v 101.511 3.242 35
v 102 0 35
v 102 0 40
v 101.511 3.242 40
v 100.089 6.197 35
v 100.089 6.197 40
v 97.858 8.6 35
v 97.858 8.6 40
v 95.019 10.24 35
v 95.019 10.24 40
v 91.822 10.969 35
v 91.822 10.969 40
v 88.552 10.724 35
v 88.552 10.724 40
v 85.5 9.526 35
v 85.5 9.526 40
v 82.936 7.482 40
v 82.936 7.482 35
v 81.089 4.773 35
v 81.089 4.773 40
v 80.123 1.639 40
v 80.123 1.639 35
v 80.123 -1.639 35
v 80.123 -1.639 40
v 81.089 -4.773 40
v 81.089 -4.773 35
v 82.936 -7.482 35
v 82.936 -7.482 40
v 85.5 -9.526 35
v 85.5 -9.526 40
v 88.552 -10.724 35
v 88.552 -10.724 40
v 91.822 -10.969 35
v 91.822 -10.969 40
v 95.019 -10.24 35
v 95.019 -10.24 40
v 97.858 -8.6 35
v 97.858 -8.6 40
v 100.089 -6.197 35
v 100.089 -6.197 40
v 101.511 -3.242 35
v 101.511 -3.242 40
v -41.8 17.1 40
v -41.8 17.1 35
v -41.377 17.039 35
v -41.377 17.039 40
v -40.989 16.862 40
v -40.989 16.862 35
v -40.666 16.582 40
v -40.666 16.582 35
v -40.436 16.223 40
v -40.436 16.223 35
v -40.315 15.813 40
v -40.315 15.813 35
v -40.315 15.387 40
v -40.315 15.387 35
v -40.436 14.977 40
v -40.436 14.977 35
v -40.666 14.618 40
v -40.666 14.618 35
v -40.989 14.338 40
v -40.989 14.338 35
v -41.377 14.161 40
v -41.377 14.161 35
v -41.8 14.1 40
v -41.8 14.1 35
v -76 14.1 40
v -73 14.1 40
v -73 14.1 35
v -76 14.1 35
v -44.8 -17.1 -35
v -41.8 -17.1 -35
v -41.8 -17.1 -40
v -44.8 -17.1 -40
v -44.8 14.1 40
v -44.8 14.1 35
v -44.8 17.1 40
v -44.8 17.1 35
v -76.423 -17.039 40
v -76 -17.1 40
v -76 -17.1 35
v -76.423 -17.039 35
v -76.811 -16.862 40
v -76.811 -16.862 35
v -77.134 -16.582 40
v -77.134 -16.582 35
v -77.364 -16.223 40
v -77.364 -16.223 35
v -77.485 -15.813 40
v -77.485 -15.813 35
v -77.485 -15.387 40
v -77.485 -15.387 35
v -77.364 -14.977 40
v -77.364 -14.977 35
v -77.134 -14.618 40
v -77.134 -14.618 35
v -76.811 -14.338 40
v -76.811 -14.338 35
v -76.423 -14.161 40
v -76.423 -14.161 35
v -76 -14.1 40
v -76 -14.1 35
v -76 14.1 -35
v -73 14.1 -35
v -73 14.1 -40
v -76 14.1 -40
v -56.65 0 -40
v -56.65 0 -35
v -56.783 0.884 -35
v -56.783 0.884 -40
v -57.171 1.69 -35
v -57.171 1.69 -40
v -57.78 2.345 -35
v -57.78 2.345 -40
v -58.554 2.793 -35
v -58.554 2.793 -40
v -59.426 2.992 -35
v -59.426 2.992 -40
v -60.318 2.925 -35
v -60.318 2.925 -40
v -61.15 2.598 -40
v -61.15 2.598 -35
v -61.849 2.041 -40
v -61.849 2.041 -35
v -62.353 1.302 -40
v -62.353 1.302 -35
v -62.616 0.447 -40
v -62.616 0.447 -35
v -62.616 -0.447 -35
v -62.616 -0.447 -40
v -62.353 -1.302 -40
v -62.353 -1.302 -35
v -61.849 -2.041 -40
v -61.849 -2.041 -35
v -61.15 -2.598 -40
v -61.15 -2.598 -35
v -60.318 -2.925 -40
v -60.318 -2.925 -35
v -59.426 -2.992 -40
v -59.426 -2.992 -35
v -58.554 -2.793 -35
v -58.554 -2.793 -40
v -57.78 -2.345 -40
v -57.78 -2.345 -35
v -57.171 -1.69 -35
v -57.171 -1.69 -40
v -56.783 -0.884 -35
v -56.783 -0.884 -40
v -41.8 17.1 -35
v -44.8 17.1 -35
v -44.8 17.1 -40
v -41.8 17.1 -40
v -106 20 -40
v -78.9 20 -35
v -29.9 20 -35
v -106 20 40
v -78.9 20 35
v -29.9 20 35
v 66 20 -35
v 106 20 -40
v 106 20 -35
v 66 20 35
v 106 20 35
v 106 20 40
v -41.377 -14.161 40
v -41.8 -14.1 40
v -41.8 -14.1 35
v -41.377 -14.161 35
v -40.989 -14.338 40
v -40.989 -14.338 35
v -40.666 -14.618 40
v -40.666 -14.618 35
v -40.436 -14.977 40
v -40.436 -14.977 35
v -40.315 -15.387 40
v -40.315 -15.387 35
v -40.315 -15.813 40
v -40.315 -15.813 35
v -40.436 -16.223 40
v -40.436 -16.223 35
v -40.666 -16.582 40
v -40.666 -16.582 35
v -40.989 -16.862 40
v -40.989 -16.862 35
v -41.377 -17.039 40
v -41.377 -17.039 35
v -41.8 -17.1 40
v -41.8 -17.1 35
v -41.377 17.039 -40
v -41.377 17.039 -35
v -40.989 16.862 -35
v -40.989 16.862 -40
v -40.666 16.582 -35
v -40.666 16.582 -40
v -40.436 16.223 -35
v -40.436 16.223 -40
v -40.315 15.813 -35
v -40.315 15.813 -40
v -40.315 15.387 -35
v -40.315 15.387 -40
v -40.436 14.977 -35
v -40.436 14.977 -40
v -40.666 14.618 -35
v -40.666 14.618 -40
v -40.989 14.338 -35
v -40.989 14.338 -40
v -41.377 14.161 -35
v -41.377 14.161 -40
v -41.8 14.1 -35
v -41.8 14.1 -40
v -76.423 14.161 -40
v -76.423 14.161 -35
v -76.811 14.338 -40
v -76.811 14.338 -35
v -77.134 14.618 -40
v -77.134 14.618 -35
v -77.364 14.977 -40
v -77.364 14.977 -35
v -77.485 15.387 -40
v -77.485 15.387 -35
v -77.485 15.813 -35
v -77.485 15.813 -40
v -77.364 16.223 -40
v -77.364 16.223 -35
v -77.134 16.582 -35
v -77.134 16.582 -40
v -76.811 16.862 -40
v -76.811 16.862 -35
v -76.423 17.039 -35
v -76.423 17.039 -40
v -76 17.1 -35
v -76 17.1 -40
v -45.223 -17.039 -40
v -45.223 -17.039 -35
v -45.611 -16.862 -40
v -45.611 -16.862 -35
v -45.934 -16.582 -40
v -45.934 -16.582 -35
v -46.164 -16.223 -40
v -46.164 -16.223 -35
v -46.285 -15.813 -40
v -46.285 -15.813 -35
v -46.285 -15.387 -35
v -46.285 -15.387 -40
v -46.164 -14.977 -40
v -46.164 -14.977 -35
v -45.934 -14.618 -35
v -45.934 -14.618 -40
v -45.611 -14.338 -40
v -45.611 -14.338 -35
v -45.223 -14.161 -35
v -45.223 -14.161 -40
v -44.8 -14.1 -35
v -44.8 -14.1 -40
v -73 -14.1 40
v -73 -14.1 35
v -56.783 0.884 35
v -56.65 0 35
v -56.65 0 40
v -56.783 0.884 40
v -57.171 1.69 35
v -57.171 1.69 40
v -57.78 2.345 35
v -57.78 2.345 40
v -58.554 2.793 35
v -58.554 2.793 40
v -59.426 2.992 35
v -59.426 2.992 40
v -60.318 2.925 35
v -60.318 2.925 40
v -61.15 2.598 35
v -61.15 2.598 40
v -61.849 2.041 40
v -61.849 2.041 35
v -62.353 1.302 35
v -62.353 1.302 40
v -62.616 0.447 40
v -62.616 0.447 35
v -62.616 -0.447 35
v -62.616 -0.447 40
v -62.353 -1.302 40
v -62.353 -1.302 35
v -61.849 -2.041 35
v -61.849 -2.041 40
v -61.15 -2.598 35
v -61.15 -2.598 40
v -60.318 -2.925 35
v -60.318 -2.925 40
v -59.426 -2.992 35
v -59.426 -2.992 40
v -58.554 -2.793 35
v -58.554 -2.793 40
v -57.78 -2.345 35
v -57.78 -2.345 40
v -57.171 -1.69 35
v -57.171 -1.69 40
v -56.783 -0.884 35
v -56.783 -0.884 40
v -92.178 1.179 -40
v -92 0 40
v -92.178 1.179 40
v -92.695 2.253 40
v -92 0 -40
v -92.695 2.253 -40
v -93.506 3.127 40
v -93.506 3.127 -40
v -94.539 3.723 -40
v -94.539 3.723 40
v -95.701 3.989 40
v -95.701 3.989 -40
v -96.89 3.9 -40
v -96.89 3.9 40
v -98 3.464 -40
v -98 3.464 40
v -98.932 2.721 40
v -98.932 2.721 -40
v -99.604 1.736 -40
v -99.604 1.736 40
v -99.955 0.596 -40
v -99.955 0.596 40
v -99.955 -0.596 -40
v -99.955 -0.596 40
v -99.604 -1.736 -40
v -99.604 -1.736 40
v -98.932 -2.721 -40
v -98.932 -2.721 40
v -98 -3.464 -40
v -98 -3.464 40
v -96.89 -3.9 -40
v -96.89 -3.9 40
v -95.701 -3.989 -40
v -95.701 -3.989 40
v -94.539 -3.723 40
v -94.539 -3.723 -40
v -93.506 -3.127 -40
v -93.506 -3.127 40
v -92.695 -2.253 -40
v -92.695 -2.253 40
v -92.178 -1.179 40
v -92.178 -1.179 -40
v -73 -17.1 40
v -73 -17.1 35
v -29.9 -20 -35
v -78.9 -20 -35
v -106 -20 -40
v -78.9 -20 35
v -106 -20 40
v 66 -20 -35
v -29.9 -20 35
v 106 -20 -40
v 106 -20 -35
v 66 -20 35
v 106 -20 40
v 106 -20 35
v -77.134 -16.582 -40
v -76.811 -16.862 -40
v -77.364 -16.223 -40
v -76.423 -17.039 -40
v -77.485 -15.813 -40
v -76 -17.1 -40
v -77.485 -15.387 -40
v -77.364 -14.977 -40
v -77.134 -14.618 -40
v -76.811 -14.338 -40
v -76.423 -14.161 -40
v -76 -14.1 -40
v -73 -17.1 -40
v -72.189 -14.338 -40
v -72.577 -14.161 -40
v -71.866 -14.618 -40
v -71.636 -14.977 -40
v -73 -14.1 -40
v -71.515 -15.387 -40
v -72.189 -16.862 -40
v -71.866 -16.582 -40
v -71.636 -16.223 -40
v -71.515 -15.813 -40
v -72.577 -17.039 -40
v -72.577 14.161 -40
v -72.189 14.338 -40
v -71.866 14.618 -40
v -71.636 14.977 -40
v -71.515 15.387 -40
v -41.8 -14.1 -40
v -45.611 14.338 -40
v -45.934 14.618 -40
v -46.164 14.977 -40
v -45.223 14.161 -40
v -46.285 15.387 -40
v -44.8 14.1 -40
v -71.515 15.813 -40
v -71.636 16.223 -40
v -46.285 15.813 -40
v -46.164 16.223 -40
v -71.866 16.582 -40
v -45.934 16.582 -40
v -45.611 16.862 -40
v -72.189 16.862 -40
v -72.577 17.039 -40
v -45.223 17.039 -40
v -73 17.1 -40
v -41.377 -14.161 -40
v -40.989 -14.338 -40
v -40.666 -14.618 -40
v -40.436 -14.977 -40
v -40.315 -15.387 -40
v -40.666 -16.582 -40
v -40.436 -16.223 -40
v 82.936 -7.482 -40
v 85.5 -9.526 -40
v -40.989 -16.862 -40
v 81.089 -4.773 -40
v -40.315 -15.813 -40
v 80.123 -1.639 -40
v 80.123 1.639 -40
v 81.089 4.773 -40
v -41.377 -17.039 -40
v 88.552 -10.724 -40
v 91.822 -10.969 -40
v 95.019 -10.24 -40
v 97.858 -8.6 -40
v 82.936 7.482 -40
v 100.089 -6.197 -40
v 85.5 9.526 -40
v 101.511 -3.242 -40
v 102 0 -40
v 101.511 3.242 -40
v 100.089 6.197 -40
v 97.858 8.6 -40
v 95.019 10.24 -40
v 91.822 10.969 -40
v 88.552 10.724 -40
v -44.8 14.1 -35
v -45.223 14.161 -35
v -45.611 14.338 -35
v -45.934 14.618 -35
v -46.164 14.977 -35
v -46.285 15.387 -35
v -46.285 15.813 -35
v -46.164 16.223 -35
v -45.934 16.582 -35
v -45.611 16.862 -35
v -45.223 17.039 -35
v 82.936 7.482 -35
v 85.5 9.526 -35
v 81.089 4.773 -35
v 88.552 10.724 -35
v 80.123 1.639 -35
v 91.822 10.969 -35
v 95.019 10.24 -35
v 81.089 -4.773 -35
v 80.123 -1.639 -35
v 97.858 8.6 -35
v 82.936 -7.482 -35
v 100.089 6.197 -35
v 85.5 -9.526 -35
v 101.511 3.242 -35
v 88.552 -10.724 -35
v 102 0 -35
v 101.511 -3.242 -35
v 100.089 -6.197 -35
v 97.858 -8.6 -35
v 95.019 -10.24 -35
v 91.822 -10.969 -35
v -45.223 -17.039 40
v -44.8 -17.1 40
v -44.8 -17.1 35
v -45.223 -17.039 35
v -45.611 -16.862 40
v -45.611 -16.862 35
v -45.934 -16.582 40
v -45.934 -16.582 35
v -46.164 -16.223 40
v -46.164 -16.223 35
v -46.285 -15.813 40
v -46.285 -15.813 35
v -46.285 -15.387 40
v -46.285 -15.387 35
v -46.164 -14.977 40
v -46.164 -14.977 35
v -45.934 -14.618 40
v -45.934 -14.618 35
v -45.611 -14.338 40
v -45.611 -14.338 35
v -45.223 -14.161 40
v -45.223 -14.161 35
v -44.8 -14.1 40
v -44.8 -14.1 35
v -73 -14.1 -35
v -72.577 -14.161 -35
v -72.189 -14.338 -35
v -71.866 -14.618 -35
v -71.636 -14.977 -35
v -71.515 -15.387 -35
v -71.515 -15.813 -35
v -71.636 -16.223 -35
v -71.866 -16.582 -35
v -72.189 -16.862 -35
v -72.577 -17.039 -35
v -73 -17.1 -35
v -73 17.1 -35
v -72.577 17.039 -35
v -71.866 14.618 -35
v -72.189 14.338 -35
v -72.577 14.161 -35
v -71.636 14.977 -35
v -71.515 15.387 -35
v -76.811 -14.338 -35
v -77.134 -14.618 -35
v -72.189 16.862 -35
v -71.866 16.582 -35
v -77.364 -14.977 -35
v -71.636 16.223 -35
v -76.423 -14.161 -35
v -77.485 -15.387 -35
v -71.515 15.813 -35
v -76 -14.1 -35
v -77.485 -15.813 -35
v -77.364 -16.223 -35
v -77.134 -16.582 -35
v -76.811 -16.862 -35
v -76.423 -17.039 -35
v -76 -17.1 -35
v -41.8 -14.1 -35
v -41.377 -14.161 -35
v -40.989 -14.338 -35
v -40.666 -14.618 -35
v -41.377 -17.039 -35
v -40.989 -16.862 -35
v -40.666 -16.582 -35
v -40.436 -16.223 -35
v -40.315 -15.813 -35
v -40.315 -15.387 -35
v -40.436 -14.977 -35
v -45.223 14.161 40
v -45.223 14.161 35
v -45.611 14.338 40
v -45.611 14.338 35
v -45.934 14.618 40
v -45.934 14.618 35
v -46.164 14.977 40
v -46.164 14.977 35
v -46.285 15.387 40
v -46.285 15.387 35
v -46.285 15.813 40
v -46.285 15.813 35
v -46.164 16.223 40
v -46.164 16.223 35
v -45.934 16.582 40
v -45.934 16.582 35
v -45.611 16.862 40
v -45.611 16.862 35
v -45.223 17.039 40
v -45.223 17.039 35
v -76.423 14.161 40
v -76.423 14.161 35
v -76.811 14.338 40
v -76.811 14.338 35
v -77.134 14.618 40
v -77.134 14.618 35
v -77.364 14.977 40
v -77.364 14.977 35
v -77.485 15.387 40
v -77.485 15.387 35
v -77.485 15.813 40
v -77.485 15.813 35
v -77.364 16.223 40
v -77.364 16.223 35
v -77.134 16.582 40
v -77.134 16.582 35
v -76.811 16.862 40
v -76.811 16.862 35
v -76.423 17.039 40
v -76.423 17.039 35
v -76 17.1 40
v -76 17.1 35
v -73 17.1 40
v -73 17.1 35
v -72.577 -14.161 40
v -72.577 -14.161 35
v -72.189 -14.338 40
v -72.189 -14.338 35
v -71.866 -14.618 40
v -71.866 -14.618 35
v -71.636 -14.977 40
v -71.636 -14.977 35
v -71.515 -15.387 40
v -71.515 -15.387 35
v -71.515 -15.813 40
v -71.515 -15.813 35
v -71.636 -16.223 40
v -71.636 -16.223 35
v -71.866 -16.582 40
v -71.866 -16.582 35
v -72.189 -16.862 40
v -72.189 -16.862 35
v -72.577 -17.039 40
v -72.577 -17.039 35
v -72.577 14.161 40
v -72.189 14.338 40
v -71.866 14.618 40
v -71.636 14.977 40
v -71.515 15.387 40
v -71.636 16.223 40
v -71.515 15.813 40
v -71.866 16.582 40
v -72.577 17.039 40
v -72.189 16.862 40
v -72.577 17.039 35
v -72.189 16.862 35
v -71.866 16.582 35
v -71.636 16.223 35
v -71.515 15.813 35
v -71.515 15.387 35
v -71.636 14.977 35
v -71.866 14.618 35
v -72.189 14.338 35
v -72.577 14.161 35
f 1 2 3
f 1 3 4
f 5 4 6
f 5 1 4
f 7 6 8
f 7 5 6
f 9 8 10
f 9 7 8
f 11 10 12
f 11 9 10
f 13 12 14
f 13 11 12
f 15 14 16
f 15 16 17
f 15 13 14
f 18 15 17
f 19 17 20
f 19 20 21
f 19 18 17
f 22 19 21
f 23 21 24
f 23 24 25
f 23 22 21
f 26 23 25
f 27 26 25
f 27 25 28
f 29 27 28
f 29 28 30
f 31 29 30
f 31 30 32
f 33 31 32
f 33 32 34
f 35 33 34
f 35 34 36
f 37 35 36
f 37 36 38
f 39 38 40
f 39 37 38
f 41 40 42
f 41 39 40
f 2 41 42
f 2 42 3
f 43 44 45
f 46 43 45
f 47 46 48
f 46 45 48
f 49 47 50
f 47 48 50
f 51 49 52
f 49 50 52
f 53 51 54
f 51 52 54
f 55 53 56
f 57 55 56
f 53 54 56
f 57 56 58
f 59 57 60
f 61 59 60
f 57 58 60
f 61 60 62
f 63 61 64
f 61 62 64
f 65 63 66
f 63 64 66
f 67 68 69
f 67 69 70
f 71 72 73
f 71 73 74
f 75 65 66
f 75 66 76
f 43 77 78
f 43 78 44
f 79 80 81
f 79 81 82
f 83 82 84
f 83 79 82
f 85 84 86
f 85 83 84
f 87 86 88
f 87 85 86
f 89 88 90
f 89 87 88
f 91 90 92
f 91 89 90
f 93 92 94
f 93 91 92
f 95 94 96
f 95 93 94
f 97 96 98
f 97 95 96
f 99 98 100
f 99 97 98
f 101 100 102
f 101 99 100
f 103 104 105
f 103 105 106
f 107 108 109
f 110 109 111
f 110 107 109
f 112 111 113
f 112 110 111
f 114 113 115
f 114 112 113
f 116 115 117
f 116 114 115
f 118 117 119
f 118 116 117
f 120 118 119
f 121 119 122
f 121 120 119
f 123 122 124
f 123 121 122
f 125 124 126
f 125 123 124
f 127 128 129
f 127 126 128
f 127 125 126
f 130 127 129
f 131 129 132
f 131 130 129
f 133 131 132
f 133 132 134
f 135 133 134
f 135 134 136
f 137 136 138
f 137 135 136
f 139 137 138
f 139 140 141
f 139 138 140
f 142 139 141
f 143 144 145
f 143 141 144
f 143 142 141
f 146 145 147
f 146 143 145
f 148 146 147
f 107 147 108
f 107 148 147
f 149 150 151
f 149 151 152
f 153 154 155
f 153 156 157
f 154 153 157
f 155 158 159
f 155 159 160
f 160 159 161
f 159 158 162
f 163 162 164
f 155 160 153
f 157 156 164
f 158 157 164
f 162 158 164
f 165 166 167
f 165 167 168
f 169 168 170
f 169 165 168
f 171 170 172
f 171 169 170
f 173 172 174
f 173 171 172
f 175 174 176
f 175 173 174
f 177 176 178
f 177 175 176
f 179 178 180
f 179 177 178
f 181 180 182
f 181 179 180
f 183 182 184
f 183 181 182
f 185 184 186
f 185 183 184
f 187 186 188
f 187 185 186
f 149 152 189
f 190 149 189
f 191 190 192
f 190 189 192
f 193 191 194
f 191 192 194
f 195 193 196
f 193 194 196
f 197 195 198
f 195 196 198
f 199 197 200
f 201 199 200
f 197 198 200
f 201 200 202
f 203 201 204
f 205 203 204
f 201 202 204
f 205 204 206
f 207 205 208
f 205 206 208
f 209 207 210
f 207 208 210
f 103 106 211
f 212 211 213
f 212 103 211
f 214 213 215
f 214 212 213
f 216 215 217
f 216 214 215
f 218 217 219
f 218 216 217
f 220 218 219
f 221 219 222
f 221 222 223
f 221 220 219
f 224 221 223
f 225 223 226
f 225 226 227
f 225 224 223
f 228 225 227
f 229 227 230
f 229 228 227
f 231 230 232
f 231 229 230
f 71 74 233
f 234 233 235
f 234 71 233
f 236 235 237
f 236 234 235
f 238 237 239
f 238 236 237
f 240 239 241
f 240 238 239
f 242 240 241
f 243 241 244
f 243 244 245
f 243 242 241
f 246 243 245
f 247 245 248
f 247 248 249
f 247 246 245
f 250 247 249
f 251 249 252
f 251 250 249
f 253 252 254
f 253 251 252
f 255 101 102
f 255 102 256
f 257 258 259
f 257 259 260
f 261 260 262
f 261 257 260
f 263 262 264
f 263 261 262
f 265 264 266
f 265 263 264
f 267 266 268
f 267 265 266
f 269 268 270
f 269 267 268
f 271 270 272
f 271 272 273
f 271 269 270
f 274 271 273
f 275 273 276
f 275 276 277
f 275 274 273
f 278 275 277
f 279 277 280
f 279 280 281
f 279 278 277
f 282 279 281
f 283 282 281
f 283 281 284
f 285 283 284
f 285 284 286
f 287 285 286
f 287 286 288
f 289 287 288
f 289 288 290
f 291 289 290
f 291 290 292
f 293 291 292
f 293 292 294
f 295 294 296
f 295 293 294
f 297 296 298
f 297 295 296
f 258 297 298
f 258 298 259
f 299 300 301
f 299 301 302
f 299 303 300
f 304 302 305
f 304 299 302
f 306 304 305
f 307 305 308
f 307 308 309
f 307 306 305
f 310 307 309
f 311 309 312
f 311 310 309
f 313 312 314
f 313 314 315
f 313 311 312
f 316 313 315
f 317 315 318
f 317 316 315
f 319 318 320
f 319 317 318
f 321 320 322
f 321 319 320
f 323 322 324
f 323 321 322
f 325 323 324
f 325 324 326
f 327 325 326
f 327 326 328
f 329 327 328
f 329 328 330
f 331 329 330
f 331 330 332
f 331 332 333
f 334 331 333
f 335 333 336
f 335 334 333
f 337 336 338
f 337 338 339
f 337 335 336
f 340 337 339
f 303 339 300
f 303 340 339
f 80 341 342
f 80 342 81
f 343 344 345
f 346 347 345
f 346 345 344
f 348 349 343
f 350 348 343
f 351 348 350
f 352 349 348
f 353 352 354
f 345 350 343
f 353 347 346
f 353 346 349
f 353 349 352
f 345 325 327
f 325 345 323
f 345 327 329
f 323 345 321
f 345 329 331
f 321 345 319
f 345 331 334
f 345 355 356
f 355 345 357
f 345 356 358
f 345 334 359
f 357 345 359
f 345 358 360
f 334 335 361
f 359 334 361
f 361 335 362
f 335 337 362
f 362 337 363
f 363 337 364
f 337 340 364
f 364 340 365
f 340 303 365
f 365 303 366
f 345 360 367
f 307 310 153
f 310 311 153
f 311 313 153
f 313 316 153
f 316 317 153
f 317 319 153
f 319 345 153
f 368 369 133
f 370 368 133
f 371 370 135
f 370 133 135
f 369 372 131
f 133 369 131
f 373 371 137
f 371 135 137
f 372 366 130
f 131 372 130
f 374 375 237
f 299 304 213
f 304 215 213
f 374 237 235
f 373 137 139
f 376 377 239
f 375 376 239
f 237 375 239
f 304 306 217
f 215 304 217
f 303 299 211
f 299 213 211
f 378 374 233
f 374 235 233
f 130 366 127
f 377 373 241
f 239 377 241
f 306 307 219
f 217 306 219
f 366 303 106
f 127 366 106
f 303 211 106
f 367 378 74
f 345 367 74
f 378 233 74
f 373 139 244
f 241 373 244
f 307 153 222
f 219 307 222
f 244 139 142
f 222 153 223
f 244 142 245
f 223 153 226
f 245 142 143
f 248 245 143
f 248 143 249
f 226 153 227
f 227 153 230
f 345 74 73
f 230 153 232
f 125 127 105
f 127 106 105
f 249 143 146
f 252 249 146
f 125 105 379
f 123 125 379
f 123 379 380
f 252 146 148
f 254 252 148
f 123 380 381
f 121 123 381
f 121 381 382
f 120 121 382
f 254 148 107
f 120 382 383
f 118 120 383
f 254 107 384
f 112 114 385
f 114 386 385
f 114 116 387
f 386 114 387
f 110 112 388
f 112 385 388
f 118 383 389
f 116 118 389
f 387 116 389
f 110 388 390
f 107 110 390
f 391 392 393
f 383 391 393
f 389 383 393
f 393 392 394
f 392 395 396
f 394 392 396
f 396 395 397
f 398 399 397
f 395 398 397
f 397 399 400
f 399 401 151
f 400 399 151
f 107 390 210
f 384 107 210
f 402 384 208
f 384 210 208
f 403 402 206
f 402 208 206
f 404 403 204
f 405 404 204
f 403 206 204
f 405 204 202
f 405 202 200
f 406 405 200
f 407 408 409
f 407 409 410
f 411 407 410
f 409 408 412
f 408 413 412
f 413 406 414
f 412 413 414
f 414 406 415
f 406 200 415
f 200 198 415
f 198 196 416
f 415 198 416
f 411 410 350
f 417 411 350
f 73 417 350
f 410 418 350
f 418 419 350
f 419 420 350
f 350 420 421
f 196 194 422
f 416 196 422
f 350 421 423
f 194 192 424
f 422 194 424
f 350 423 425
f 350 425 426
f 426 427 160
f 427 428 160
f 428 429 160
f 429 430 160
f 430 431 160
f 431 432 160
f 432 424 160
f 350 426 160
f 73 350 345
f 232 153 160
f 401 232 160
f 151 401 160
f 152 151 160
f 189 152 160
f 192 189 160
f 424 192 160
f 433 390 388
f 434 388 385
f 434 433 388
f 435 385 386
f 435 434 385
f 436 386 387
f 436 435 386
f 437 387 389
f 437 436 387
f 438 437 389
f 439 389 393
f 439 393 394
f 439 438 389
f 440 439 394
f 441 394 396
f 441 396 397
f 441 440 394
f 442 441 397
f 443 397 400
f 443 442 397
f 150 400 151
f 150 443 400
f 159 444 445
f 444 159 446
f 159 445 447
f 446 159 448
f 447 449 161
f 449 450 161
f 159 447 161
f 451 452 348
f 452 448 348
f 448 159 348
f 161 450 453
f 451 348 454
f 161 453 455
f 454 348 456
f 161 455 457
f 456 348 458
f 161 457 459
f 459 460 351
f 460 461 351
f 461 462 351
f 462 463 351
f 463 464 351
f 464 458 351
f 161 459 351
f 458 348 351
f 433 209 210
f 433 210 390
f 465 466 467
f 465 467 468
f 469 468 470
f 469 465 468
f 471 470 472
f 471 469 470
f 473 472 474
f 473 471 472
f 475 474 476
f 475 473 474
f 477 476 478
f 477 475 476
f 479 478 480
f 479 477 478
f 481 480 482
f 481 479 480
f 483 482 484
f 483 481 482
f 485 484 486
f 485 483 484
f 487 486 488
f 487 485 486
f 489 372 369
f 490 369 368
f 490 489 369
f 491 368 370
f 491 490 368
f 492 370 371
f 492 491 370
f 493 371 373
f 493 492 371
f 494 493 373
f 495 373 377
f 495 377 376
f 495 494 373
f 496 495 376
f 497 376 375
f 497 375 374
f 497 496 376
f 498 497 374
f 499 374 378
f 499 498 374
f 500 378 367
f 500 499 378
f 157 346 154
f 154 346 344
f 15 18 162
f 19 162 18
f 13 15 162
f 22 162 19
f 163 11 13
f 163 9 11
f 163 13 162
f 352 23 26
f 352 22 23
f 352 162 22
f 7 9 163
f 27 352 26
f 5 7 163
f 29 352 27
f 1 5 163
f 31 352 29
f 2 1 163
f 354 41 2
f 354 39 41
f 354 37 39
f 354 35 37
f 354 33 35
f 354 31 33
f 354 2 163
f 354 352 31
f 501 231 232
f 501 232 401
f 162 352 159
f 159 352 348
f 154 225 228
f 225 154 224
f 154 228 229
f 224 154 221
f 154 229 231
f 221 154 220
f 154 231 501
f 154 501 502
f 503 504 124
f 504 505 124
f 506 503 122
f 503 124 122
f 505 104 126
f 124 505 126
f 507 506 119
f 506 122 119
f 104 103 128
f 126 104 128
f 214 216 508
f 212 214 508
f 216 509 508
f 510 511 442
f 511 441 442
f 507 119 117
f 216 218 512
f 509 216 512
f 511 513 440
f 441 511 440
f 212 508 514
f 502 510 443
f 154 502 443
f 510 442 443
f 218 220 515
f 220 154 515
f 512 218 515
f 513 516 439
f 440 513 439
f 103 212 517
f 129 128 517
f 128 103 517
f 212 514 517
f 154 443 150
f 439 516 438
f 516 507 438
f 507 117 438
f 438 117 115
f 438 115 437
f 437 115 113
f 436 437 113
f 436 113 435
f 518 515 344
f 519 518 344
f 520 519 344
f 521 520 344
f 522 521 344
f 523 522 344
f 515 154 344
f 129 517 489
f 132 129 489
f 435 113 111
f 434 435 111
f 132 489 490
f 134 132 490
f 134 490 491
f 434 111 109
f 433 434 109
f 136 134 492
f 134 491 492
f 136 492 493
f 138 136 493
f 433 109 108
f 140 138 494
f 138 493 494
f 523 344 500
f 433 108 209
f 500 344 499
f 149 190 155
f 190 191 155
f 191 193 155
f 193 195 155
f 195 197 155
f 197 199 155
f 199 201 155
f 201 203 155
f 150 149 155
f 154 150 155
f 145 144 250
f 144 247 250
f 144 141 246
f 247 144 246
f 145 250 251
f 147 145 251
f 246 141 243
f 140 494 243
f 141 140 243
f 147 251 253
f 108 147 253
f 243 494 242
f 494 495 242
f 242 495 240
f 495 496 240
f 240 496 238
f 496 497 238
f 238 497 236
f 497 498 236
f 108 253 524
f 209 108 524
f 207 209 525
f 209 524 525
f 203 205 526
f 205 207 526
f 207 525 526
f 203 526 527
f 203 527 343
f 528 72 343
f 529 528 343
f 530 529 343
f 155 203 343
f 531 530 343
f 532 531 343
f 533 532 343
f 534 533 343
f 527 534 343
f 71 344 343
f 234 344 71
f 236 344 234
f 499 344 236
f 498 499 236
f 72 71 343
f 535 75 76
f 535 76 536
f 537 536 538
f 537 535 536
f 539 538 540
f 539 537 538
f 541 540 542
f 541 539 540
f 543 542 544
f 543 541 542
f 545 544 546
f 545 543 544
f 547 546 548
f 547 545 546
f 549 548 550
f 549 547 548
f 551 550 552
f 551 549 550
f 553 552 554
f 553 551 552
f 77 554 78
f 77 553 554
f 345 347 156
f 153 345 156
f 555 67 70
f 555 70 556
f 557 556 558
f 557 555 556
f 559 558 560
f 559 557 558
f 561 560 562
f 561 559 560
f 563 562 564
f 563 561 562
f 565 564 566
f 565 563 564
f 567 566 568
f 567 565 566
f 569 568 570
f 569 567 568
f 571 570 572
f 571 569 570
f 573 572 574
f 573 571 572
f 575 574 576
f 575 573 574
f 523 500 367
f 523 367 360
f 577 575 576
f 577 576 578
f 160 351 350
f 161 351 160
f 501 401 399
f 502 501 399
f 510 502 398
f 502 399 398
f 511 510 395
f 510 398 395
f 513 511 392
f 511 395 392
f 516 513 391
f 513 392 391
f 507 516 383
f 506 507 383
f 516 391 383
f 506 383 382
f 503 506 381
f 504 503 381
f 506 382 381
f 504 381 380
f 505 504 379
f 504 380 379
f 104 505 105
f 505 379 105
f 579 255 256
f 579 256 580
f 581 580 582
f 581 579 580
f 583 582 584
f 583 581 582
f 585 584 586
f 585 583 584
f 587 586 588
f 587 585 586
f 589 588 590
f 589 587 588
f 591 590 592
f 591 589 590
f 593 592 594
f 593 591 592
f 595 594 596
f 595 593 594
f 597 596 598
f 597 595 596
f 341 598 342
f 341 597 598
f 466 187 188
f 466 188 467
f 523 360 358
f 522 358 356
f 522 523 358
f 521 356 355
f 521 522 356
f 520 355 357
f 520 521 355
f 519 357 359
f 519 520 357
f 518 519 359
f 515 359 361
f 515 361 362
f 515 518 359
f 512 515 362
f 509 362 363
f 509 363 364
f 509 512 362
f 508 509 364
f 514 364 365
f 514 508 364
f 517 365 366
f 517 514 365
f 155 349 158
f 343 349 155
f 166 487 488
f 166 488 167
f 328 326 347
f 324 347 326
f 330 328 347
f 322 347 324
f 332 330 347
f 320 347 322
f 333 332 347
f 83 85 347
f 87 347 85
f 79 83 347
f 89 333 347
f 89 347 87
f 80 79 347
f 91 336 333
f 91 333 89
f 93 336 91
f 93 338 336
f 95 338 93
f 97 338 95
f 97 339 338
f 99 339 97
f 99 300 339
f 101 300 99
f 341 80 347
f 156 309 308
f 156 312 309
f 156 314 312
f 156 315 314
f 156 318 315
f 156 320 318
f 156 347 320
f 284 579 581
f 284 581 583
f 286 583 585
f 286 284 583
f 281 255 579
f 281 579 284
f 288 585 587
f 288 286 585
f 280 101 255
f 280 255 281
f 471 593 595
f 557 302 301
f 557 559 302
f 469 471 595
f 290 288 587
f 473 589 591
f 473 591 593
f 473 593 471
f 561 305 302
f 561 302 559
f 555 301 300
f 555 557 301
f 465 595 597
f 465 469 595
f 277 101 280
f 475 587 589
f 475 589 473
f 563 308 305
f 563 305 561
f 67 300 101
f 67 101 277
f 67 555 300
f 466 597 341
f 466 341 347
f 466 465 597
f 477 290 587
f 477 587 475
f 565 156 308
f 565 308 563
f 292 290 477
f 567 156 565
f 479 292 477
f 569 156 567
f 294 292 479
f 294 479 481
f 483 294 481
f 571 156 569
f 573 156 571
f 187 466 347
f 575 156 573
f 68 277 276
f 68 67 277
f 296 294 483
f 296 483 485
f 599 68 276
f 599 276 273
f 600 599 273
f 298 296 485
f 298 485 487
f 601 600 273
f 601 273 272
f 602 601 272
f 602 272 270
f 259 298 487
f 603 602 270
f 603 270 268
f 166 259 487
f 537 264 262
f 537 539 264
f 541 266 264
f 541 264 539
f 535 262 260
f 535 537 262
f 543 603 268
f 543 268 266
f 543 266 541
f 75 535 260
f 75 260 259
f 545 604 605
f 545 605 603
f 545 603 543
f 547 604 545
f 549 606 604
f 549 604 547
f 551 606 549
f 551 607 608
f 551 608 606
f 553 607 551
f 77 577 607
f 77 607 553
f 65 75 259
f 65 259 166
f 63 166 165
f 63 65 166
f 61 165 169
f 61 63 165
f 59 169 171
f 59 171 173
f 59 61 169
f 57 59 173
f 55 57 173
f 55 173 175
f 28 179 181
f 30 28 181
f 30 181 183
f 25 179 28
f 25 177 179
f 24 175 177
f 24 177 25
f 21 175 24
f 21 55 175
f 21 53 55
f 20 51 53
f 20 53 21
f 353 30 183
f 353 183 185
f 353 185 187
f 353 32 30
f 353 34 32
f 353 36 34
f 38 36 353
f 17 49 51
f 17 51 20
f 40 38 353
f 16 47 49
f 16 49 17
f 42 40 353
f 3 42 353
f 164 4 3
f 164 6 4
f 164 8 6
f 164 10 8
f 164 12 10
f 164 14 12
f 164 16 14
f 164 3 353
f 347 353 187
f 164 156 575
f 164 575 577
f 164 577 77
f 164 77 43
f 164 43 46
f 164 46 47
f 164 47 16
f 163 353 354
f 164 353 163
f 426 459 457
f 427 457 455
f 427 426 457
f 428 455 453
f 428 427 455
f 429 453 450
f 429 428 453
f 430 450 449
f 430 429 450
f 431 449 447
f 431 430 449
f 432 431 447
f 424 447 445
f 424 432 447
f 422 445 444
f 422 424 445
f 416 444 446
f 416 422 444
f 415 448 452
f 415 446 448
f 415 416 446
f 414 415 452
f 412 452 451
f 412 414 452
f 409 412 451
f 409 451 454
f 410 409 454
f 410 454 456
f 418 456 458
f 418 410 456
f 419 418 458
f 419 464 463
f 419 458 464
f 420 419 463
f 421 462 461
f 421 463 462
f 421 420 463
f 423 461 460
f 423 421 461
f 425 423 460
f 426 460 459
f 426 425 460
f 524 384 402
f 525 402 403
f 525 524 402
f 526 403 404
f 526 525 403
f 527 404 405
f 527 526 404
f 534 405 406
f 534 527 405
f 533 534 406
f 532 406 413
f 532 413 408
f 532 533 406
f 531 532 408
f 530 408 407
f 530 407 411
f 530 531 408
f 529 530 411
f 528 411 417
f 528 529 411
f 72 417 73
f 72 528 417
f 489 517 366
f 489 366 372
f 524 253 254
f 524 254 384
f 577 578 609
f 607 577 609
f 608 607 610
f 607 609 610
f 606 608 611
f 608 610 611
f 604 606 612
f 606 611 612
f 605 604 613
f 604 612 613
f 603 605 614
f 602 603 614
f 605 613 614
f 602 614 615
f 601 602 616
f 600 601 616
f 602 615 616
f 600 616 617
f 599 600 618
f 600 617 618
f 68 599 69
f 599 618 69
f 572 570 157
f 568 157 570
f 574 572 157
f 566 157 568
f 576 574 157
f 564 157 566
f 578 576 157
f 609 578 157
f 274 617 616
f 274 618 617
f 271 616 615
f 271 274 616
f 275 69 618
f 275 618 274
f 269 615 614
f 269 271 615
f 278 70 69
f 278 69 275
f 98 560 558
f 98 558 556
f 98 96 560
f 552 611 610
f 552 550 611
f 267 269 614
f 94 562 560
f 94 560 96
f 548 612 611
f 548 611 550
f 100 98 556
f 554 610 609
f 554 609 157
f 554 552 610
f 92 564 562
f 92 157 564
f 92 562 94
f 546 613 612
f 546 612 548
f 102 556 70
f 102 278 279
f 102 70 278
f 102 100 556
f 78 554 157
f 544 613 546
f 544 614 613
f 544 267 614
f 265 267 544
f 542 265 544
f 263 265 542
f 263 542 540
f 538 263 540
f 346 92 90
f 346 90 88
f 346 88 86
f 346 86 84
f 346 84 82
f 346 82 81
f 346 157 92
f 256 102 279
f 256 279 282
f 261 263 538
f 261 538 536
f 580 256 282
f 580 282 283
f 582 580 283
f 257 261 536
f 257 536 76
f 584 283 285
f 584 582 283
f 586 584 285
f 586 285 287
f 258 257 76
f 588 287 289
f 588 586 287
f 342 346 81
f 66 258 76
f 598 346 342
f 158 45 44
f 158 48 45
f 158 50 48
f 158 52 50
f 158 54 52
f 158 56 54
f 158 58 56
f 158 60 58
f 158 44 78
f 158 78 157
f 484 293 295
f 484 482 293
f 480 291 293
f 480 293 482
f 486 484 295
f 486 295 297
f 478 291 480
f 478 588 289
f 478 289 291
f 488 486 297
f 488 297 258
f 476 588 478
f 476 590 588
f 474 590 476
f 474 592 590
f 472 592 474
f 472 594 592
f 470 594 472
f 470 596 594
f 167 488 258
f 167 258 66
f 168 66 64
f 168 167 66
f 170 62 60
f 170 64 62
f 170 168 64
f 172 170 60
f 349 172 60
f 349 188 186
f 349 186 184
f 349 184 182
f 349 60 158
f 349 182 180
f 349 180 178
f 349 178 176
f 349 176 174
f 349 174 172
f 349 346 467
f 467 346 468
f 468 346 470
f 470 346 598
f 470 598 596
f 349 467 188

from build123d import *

# Parameters (mm, degrees)
SKETCH1_W               = 212
SKETCH1_H               = 40
SKETCH1_R               = 4
SKETCH1_R_2             = 3
SKETCH1_R_3             = 11
BOSS_EXTRUDE1_DEPTH     = 40
CUT_EXTRUDE3_DEPTH      = 116.047816146
CUT_EXTRUDE3_DEPTH_BACK = 116.047816146
SKETCH2_W               = 49
SKETCH2_H               = 70
SKETCH2_W_2             = 40


with BuildPart() as part:
    # Sketch1 → Boss-Extrude1 (new, symmetric)
    with BuildSketch(Plane.XY):
        Rectangle(SKETCH1_W, SKETCH1_H)
        with Locations((-96, 0)):
            Circle(SKETCH1_R, mode=Mode.SUBTRACT)
        with Locations((-59.65, 0)):
            Circle(SKETCH1_R_2, mode=Mode.SUBTRACT)
        with Locations((91, 0)):
            Circle(SKETCH1_R_3, mode=Mode.SUBTRACT)
        with BuildLine():
            Line((-76, 17.1), (-73, 17.1))
            ThreePointArc((-73, 17.1), (-71.5, 15.6), (-73, 14.1))
            Line((-73, 14.1), (-76, 14.1))
            ThreePointArc((-76, 14.1), (-77.5, 15.6), (-76, 17.1))
        make_face(mode=Mode.SUBTRACT)
        with BuildLine():
            Line((-44.8, 17.1), (-41.8, 17.1))
            ThreePointArc((-41.8, 17.1), (-40.3, 15.6), (-41.8, 14.1))
            Line((-41.8, 14.1), (-44.8, 14.1))
            ThreePointArc((-44.8, 14.1), (-46.3, 15.6), (-44.8, 17.1))
        make_face(mode=Mode.SUBTRACT)
        with BuildLine():
            Line((-76, -14.1), (-73, -14.1))
            ThreePointArc((-73, -14.1), (-71.5, -15.6), (-73, -17.1))
            Line((-73, -17.1), (-76, -17.1))
            ThreePointArc((-76, -17.1), (-77.5, -15.6), (-76, -14.1))
        make_face(mode=Mode.SUBTRACT)
        with BuildLine():
            Line((-44.8, -14.1), (-41.8, -14.1))
            ThreePointArc((-41.8, -14.1), (-40.3, -15.6), (-41.8, -17.1))
            Line((-41.8, -17.1), (-44.8, -17.1))
            ThreePointArc((-44.8, -17.1), (-46.3, -15.6), (-44.8, -14.1))
        make_face(mode=Mode.SUBTRACT)
    extrude(amount=BOSS_EXTRUDE1_DEPTH, both=True)

    # Sketch2 → Cut-Extrude3 (cut, two sides: drawn at the far end of the back side and taken through both)
    with BuildSketch(Plane(origin=(0, 0, 0), x_dir=(1, 0, 0), z_dir=(0, 1, 0)).offset(-CUT_EXTRUDE3_DEPTH_BACK)):
        with Locations((-54.4, 0)):
            Rectangle(SKETCH2_W, SKETCH2_H)
        with Locations((86, 0)):
            Rectangle(SKETCH2_W_2, SKETCH2_H)
    extrude(amount=CUT_EXTRUDE3_DEPTH + CUT_EXTRUDE3_DEPTH_BACK, mode=Mode.SUBTRACT)


solid = part.part
